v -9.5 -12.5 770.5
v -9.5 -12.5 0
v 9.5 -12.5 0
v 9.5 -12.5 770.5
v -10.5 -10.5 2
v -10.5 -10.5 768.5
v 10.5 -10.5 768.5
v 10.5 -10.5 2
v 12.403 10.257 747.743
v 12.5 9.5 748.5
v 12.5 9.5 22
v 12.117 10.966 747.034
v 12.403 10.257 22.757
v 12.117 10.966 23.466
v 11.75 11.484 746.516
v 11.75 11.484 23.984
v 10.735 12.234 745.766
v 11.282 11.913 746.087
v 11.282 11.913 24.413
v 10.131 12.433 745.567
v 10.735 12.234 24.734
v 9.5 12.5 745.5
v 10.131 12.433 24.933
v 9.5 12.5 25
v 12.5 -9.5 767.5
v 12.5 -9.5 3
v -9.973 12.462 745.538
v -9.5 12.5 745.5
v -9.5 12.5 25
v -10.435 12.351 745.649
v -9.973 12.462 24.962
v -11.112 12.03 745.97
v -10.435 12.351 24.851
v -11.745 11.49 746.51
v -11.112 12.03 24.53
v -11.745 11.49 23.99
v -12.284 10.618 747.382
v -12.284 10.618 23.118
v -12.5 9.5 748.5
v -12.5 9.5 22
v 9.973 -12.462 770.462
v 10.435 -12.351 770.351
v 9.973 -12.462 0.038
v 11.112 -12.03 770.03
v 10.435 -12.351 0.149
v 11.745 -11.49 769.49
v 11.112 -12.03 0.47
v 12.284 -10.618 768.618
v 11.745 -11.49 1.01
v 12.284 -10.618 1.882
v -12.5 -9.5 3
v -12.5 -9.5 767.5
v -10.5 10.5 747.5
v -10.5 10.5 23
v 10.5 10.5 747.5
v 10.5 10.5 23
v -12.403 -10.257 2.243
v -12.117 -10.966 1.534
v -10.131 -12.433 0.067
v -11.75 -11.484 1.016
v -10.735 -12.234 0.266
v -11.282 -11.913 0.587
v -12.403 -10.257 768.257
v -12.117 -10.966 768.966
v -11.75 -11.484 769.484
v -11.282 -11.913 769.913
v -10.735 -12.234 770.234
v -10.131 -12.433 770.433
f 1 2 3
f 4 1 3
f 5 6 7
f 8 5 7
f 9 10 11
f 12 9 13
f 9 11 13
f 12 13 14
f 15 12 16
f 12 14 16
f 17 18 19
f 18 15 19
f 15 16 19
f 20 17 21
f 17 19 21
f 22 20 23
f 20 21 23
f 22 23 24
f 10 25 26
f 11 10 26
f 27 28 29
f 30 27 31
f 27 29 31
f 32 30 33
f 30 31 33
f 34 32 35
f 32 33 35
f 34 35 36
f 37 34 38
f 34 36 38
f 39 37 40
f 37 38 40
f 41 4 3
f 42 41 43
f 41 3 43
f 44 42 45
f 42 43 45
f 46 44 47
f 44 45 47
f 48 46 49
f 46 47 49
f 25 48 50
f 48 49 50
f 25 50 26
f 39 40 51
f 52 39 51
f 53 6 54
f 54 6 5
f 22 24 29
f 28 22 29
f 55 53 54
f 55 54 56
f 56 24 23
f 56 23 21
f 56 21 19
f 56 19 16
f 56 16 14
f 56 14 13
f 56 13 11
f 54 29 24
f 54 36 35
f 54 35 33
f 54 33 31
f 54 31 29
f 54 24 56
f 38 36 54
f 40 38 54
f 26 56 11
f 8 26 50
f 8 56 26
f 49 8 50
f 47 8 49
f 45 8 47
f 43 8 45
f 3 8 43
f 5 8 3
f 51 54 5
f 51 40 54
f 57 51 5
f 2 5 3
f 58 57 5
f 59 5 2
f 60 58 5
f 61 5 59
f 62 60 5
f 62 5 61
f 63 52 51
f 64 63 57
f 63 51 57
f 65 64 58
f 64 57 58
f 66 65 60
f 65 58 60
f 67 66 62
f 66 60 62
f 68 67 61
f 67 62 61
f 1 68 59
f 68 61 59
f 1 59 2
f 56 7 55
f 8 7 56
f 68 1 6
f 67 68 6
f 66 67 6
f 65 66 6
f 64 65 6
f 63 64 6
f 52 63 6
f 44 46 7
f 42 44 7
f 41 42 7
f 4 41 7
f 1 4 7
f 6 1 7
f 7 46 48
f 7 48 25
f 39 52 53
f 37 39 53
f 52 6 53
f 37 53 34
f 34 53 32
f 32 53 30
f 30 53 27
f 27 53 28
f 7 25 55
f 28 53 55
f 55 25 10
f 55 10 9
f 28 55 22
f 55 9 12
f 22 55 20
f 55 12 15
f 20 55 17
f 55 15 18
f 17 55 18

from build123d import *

# Parameters (mm, degrees)
F0_W     = 21
F0_H     = 21
F1_DEPTH = 800
F3_DEPTH = 12.5


with BuildPart() as f1:
    # F0 (on Top) → F1 (new body)
    with BuildSketch(Plane.XY):
        with BuildLine():
            ThreePointArc((12.5, 9.5), (11.62132, 11.62132), (9.5, 12.5))
            Line((9.5, 12.5), (-9.5, 12.5))
            ThreePointArc((-9.5, 12.5), (-11.62132, 11.62132), (-12.5, 9.5))
            Line((-12.5, 9.5), (-12.5, -9.5))
            ThreePointArc((-12.5, -9.5), (-11.62132, -11.62132), (-9.5, -12.5))
            Line((-9.5, -12.5), (9.5, -12.5))
            ThreePointArc((9.5, -12.5), (11.62132, -11.62132), (12.5, -9.5))
            Line((12.5, -9.5), (12.5, 9.5))
        make_face()
        Rectangle(F0_W, F0_H, mode=Mode.SUBTRACT)
    extrude(amount=F1_DEPTH)

    # F2 (on Right) → F3 (cut, symmetric)
    with BuildSketch(Plane.YZ):
        Polygon((12.5, 25), (-12.5, 0), (12.5, 0), align=None)
        Polygon((-12.5, 770.5), (12.5, 745.5), (12.5, 800), (-12.5, 800), align=None)
    extrude(amount=F3_DEPTH, both=True, mode=Mode.SUBTRACT)


solid = f1.part
